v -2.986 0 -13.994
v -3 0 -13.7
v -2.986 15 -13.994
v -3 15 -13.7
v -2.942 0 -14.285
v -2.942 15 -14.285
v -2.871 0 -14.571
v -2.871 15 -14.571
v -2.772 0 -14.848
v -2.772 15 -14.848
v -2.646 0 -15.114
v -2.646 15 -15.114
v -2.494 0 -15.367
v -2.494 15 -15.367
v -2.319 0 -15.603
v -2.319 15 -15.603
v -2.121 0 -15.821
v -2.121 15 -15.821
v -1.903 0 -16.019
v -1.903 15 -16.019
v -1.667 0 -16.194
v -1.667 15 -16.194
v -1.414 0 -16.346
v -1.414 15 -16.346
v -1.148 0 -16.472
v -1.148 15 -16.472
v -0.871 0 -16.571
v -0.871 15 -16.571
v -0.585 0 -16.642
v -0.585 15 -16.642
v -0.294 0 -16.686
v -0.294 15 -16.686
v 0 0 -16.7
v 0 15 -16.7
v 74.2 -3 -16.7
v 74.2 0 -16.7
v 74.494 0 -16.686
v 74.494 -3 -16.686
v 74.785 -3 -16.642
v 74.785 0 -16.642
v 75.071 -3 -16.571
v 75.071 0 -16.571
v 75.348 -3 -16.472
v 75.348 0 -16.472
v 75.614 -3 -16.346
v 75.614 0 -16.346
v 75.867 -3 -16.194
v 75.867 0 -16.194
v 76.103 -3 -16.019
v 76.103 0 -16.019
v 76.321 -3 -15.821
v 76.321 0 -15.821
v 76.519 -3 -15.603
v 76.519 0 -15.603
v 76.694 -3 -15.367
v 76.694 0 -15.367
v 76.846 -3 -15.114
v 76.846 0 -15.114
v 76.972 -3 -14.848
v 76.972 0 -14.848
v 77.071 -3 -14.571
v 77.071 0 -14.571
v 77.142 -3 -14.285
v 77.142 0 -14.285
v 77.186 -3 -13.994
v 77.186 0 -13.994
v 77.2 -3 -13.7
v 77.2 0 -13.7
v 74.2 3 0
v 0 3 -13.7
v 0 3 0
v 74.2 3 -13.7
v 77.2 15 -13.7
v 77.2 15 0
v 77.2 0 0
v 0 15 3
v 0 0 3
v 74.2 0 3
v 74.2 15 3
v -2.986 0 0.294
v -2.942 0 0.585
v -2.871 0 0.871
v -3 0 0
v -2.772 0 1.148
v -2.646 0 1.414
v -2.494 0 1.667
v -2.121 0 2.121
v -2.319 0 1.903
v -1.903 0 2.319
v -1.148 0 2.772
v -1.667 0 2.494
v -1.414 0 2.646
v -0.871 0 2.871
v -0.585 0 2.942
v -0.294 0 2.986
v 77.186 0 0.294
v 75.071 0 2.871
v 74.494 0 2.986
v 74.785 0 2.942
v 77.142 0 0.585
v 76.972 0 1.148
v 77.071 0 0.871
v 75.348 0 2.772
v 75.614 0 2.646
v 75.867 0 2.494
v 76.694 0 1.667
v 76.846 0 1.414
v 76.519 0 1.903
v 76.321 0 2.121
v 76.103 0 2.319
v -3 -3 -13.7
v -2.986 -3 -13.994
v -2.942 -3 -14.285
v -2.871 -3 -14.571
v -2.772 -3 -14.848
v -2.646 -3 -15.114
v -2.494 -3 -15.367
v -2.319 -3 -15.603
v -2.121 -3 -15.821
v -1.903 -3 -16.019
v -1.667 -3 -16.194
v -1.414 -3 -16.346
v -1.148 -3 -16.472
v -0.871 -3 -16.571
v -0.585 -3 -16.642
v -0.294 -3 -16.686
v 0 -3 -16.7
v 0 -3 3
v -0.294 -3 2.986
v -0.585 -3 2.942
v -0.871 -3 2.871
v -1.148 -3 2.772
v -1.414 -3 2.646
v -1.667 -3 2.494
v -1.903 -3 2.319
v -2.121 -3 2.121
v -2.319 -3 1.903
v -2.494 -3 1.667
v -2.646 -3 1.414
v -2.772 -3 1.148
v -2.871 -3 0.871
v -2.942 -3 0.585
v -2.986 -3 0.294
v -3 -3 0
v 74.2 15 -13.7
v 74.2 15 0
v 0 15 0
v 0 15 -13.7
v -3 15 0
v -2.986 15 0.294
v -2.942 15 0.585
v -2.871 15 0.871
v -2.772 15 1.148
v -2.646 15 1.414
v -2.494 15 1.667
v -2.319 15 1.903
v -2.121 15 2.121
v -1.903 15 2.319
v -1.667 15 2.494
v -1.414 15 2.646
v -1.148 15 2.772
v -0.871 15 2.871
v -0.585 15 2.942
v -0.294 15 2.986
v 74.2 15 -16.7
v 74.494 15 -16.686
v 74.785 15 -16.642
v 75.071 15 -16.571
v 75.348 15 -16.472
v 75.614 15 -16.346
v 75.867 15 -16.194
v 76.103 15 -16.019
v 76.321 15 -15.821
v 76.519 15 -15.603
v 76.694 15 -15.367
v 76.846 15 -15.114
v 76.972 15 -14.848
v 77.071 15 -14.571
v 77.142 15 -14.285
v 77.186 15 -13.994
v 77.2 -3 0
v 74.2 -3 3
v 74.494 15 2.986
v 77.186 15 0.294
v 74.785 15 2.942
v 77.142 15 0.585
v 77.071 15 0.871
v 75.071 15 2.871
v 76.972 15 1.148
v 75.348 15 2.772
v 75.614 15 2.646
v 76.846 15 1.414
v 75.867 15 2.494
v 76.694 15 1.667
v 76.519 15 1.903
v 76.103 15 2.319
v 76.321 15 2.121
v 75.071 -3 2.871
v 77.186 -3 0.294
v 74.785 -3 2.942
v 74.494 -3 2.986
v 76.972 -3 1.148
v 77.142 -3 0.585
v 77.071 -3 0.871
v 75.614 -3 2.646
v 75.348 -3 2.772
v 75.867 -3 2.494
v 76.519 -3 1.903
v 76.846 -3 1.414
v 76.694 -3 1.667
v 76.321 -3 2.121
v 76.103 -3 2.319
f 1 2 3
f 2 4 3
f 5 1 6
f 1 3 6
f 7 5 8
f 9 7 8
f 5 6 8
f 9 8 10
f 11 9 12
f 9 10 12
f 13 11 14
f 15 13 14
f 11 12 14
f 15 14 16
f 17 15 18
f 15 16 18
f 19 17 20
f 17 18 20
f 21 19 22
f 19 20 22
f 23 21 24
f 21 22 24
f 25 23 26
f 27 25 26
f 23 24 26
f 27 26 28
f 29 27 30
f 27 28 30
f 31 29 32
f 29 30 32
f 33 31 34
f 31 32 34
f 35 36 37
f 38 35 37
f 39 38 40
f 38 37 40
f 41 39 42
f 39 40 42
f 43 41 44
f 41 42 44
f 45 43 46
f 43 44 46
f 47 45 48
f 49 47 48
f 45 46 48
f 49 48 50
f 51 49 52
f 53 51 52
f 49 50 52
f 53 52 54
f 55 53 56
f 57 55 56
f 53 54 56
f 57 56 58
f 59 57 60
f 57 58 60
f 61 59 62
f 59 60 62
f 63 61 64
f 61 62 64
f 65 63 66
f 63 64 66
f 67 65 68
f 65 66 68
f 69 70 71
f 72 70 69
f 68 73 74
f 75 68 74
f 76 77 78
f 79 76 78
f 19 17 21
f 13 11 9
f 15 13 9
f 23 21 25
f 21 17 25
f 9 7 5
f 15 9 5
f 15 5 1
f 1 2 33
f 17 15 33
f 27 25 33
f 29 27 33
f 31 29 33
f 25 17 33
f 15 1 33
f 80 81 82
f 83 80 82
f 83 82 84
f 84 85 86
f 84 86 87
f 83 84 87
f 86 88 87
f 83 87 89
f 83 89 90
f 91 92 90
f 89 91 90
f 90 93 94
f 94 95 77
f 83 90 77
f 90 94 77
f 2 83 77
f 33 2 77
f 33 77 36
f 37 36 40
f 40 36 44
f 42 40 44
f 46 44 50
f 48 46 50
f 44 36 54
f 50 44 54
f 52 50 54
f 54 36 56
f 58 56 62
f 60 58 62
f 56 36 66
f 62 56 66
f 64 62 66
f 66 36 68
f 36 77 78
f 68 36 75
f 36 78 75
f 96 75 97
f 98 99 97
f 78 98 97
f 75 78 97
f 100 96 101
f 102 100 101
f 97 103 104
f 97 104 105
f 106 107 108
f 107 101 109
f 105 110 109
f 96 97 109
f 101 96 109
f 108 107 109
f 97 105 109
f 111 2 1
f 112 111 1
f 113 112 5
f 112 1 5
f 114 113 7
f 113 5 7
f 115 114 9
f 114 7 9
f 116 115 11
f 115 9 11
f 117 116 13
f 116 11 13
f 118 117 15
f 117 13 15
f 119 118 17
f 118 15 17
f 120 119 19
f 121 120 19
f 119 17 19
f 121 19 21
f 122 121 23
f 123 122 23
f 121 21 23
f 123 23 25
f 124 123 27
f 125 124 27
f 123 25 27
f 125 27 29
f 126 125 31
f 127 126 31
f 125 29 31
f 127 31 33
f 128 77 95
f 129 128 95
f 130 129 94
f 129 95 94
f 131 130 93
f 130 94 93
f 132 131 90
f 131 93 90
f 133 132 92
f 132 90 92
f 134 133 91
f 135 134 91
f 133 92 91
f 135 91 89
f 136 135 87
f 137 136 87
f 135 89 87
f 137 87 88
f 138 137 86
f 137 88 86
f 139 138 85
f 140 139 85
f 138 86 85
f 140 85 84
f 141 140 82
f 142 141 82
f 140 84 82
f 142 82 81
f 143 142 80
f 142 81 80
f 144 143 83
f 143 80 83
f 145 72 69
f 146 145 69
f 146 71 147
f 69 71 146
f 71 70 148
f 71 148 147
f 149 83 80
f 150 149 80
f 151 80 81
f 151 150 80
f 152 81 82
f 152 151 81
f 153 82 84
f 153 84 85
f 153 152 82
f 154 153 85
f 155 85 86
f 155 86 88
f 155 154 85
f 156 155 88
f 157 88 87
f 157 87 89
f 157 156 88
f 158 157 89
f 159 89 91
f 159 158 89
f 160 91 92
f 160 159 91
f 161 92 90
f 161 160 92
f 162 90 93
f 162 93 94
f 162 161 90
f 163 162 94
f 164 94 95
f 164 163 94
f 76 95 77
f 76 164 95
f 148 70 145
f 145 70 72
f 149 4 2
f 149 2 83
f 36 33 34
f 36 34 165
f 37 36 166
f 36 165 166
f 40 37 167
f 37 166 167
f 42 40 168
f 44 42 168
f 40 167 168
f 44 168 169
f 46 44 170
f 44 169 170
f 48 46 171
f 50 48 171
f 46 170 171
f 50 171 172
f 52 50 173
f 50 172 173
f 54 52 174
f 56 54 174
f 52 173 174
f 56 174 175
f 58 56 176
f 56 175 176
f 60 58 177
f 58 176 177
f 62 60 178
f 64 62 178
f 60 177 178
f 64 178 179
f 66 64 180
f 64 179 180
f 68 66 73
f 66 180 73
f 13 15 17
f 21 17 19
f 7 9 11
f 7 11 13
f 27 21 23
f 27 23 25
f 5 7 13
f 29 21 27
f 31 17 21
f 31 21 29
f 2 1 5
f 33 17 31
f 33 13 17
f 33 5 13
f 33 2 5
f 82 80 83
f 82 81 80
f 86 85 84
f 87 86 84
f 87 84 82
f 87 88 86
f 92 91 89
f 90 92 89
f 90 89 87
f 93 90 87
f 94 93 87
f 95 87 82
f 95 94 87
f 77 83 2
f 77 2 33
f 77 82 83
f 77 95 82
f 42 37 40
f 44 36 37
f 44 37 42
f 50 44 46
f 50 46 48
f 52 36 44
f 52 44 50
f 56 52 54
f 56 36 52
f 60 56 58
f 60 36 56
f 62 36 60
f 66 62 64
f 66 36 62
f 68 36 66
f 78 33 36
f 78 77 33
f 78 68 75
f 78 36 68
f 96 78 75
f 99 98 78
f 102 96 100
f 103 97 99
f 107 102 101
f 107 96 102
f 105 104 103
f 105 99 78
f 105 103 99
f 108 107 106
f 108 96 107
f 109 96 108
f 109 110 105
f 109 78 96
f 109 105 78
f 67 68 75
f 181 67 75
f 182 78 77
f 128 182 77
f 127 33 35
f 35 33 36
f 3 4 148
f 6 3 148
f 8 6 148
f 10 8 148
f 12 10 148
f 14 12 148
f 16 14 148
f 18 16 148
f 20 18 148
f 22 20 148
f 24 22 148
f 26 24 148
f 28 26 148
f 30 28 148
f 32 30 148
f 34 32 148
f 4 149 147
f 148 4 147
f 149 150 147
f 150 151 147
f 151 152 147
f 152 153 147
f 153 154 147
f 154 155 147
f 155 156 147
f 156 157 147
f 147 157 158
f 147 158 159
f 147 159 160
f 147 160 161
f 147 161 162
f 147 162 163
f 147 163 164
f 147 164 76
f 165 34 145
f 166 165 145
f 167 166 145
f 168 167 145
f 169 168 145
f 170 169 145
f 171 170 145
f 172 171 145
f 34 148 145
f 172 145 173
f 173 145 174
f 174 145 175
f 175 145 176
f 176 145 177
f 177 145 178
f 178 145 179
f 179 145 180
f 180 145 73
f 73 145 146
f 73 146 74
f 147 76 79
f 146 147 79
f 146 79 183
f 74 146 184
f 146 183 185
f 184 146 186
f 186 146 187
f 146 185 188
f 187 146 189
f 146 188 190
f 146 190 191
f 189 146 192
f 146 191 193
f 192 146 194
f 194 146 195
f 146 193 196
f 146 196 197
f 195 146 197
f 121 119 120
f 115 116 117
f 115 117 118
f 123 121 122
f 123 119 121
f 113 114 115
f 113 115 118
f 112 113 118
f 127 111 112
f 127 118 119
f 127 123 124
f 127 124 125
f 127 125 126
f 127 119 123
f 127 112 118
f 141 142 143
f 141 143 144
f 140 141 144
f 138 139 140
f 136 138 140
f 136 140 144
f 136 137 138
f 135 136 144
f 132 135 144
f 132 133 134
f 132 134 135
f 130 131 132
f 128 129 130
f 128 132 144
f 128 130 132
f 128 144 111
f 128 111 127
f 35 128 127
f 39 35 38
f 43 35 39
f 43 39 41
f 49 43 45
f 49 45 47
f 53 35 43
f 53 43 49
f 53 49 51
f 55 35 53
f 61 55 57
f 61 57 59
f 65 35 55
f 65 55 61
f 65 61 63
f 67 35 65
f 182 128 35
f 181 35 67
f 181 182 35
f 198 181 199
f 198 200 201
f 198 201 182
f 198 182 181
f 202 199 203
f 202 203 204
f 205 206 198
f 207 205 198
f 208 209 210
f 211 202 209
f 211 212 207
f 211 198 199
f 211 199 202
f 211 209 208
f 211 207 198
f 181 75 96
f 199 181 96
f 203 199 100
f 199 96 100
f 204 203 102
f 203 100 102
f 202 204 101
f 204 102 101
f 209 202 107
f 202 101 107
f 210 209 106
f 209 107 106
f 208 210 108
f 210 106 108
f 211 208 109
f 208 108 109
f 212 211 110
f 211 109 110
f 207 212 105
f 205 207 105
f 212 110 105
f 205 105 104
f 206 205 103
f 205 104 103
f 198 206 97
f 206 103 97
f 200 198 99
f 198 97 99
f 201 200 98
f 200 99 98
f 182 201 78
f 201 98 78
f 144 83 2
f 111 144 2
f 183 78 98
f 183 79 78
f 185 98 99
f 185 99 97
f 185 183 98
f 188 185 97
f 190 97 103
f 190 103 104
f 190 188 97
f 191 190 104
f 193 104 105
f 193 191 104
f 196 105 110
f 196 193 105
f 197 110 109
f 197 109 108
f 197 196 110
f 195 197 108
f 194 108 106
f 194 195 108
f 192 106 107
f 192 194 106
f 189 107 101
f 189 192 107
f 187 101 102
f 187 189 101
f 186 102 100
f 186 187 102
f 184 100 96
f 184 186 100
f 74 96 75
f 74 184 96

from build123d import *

# Parameters (mm, degrees)
SKETCH1_W           = 74.2
SKETCH1_H           = 13.7
BOSS_EXTRUDE1_DEPTH = 3
SKETCH2_W           = 80.2
SKETCH2_H           = 19.7
SKETCH2_W_2         = 74.2
SKETCH2_H_2         = 13.7
BOSS_EXTRUDE2_DEPTH = 15
FILLET1_R           = 3
BOSS_EXTRUDE3_DEPTH = 3


with BuildPart() as part:
    # Sketch1 → Boss-Extrude1 (new body)
    with BuildSketch(Plane(origin=(0, 0, 0), x_dir=(1, 0, 0), z_dir=(0, 1, 0))):
        with Locations((37.1, 6.85)):
            Rectangle(SKETCH1_W, SKETCH1_H)
    extrude(amount=BOSS_EXTRUDE1_DEPTH)

    # Sketch2 → Boss-Extrude2 (add)
    with BuildSketch(Plane.XZ):
        with Locations((37.1, -6.85)):
            Rectangle(SKETCH2_W, SKETCH2_H)
        with Locations((37.1, -6.85)):
            Rectangle(SKETCH2_W_2, SKETCH2_H_2, mode=Mode.SUBTRACT)
    extrude(amount=-BOSS_EXTRUDE2_DEPTH)

    # Fillet1
    fillet1_edges = [part.edges().sort_by_distance(p)[0] for p in [
        (77.2, 7.5, 3),
        (77.2, 7.5, -16.7),
        (-3, 7.5, -16.7),
        (-3, 7.5, 3),
    ]]
    fillet(fillet1_edges, radius=FILLET1_R)


with BuildPart() as body_2:
    # Sketch3 → Boss-Extrude3 (new body)
    with BuildSketch(Plane.XZ):
        with BuildLine():
            Line((77.2, -13.7), (77.2, 0))
            ThreePointArc((77.2, 0), (76.321320344, 2.121320344), (74.2, 3))
            Line((74.2, 3), (0, 3))
            ThreePointArc((0, 3), (-2.121320344, 2.121320344), (-3, 0))
            Line((-3, 0), (-3, -13.7))
            ThreePointArc((-3, -13.7), (-2.121320344, -15.821320344), (0, -16.7))
            Line((0, -16.7), (74.2, -16.7))
            ThreePointArc((74.2, -16.7), (76.321320344, -15.821320344), (77.2, -13.7))
        make_face()
    extrude(amount=BOSS_EXTRUDE3_DEPTH)


solid = Compound([part.part, body_2.part])
